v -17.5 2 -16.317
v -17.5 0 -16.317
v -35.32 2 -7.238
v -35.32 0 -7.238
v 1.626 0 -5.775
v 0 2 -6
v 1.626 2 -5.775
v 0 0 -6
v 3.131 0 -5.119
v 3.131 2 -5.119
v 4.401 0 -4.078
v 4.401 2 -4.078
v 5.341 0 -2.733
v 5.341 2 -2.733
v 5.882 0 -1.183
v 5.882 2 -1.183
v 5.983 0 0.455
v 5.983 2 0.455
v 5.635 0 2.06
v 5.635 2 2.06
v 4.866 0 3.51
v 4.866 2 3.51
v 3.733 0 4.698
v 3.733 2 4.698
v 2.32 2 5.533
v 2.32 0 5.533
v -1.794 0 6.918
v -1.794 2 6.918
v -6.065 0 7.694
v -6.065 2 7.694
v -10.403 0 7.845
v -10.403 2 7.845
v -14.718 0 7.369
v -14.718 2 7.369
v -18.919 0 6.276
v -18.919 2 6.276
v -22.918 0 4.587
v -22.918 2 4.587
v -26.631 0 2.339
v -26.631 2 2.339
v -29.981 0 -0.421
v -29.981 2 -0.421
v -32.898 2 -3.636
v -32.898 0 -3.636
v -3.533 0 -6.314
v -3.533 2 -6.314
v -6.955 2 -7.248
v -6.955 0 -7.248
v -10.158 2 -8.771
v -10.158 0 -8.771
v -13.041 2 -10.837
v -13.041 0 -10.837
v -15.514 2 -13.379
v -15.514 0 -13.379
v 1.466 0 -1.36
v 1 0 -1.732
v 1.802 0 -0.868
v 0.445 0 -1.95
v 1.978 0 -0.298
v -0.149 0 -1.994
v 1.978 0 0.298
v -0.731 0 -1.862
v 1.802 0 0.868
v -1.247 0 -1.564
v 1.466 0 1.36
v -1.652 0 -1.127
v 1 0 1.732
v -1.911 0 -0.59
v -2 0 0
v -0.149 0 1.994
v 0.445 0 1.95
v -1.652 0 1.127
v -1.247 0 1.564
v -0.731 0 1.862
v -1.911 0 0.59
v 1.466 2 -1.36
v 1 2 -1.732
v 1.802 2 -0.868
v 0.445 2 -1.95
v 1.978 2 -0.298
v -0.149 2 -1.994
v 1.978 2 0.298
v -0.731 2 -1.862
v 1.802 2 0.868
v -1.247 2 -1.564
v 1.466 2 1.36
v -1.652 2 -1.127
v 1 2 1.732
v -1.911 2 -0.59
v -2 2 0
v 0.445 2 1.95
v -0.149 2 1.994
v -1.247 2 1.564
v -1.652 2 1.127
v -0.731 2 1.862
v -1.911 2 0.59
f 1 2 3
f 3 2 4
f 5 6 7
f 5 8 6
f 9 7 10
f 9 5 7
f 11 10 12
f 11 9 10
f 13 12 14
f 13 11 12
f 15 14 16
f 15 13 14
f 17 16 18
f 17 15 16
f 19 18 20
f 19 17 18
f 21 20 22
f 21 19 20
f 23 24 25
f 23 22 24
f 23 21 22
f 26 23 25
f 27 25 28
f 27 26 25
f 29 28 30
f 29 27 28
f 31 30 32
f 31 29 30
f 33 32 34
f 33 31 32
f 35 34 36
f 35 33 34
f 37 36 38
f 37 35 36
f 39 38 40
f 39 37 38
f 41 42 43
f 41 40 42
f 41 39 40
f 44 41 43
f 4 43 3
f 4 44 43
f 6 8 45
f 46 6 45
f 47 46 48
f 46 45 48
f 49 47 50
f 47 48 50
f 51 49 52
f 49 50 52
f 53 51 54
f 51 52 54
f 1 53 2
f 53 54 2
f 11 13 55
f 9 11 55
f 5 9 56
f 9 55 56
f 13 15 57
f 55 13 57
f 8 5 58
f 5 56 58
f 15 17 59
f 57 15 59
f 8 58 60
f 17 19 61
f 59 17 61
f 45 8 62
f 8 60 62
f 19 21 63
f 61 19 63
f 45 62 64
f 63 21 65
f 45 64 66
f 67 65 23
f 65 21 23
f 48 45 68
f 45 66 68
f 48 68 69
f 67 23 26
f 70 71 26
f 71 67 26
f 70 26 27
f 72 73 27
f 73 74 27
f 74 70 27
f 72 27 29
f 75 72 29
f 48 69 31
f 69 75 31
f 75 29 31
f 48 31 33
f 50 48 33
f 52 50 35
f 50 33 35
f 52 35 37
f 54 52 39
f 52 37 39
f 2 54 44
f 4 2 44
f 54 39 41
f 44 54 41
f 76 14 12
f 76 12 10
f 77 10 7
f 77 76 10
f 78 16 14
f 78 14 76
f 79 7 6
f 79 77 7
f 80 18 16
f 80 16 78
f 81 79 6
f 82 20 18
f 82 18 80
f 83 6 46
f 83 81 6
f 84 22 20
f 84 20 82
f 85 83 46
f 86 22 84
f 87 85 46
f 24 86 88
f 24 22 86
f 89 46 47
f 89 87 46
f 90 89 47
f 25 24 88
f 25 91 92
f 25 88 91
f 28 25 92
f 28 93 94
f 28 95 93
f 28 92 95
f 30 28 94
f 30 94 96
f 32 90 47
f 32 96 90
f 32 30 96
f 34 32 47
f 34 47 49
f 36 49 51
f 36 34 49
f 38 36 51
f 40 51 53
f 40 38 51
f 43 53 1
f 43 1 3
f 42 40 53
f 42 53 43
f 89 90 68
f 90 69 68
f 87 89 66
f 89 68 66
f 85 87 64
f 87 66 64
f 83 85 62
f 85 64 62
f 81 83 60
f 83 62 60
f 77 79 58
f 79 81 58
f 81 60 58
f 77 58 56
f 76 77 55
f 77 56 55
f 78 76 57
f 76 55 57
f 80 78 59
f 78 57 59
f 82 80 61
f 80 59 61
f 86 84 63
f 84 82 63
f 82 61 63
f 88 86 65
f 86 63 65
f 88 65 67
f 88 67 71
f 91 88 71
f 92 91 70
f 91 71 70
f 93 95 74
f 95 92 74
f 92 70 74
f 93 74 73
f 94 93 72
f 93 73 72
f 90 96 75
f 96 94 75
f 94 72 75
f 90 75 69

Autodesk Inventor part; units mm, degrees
ref_plane "YZ Plane" through (0, 0, 0) normal (1, 0, 0) x (0, 1, 0)
ref_plane "XZ Plane" through (0, 0, 0) normal (0, 1, 0) x (-1, 0, 0)
ref_plane "XY Plane" through (0, 0, 0) normal (0, 0, 1) x (1, 0, 0)
sketch "Sketch1" plane through (0, 0, 0) normal (0, 1, 0) x (-1, 0, 0)
  circle A0 centre (0, 0) radius 12 construction
  line L0 (0, 0) -> (0, -50) construction
  line L1 (20, -50) -> (34, -50) construction
  line L2 (34, -50) -> (34, -16) construction
  line L3 (34, -16) -> (20, -16) construction
  line L4 (20, -16) -> (20, -50) construction
  arc A1 (-2.3199, 5.5334) -> (0, -6) centre (0, 0) ccw
  arc A2 (17.5, -16.3175) -> (0, -6) centre (0, -26) ccw
  arc A3 (35.3201, -7.2377) -> (-2.3199, 5.5334) centre (9.2795, -22.1335) ccw
  circle A4 centre (0, 0) radius 2
  line L5 (17.5, -16.3175) -> (35.3201, -7.2377)
  point P0 (16, -42)
  point P1 (39, -42)
  point P2 (16, -14)
  dimension "d0" = 50
  dimension "d1" = 24
  dimension "d16" = 16
  dimension "d17" = 34
  dimension "d18" = 23
  dimension "d23" = 20
  dimension "d26" = 12
  dimension "d32" = 20
  dimension "d33" = 4
  dimension "d34" = 30
  dimension "d35" = 2.5
  dimension "d36" = 14
  dimension "d37" = 27
  dimension "d38" = 20
extrude "Extrusion1" add sketch "Sketch1" along normal blind 2
properties part number "flange_connector"
